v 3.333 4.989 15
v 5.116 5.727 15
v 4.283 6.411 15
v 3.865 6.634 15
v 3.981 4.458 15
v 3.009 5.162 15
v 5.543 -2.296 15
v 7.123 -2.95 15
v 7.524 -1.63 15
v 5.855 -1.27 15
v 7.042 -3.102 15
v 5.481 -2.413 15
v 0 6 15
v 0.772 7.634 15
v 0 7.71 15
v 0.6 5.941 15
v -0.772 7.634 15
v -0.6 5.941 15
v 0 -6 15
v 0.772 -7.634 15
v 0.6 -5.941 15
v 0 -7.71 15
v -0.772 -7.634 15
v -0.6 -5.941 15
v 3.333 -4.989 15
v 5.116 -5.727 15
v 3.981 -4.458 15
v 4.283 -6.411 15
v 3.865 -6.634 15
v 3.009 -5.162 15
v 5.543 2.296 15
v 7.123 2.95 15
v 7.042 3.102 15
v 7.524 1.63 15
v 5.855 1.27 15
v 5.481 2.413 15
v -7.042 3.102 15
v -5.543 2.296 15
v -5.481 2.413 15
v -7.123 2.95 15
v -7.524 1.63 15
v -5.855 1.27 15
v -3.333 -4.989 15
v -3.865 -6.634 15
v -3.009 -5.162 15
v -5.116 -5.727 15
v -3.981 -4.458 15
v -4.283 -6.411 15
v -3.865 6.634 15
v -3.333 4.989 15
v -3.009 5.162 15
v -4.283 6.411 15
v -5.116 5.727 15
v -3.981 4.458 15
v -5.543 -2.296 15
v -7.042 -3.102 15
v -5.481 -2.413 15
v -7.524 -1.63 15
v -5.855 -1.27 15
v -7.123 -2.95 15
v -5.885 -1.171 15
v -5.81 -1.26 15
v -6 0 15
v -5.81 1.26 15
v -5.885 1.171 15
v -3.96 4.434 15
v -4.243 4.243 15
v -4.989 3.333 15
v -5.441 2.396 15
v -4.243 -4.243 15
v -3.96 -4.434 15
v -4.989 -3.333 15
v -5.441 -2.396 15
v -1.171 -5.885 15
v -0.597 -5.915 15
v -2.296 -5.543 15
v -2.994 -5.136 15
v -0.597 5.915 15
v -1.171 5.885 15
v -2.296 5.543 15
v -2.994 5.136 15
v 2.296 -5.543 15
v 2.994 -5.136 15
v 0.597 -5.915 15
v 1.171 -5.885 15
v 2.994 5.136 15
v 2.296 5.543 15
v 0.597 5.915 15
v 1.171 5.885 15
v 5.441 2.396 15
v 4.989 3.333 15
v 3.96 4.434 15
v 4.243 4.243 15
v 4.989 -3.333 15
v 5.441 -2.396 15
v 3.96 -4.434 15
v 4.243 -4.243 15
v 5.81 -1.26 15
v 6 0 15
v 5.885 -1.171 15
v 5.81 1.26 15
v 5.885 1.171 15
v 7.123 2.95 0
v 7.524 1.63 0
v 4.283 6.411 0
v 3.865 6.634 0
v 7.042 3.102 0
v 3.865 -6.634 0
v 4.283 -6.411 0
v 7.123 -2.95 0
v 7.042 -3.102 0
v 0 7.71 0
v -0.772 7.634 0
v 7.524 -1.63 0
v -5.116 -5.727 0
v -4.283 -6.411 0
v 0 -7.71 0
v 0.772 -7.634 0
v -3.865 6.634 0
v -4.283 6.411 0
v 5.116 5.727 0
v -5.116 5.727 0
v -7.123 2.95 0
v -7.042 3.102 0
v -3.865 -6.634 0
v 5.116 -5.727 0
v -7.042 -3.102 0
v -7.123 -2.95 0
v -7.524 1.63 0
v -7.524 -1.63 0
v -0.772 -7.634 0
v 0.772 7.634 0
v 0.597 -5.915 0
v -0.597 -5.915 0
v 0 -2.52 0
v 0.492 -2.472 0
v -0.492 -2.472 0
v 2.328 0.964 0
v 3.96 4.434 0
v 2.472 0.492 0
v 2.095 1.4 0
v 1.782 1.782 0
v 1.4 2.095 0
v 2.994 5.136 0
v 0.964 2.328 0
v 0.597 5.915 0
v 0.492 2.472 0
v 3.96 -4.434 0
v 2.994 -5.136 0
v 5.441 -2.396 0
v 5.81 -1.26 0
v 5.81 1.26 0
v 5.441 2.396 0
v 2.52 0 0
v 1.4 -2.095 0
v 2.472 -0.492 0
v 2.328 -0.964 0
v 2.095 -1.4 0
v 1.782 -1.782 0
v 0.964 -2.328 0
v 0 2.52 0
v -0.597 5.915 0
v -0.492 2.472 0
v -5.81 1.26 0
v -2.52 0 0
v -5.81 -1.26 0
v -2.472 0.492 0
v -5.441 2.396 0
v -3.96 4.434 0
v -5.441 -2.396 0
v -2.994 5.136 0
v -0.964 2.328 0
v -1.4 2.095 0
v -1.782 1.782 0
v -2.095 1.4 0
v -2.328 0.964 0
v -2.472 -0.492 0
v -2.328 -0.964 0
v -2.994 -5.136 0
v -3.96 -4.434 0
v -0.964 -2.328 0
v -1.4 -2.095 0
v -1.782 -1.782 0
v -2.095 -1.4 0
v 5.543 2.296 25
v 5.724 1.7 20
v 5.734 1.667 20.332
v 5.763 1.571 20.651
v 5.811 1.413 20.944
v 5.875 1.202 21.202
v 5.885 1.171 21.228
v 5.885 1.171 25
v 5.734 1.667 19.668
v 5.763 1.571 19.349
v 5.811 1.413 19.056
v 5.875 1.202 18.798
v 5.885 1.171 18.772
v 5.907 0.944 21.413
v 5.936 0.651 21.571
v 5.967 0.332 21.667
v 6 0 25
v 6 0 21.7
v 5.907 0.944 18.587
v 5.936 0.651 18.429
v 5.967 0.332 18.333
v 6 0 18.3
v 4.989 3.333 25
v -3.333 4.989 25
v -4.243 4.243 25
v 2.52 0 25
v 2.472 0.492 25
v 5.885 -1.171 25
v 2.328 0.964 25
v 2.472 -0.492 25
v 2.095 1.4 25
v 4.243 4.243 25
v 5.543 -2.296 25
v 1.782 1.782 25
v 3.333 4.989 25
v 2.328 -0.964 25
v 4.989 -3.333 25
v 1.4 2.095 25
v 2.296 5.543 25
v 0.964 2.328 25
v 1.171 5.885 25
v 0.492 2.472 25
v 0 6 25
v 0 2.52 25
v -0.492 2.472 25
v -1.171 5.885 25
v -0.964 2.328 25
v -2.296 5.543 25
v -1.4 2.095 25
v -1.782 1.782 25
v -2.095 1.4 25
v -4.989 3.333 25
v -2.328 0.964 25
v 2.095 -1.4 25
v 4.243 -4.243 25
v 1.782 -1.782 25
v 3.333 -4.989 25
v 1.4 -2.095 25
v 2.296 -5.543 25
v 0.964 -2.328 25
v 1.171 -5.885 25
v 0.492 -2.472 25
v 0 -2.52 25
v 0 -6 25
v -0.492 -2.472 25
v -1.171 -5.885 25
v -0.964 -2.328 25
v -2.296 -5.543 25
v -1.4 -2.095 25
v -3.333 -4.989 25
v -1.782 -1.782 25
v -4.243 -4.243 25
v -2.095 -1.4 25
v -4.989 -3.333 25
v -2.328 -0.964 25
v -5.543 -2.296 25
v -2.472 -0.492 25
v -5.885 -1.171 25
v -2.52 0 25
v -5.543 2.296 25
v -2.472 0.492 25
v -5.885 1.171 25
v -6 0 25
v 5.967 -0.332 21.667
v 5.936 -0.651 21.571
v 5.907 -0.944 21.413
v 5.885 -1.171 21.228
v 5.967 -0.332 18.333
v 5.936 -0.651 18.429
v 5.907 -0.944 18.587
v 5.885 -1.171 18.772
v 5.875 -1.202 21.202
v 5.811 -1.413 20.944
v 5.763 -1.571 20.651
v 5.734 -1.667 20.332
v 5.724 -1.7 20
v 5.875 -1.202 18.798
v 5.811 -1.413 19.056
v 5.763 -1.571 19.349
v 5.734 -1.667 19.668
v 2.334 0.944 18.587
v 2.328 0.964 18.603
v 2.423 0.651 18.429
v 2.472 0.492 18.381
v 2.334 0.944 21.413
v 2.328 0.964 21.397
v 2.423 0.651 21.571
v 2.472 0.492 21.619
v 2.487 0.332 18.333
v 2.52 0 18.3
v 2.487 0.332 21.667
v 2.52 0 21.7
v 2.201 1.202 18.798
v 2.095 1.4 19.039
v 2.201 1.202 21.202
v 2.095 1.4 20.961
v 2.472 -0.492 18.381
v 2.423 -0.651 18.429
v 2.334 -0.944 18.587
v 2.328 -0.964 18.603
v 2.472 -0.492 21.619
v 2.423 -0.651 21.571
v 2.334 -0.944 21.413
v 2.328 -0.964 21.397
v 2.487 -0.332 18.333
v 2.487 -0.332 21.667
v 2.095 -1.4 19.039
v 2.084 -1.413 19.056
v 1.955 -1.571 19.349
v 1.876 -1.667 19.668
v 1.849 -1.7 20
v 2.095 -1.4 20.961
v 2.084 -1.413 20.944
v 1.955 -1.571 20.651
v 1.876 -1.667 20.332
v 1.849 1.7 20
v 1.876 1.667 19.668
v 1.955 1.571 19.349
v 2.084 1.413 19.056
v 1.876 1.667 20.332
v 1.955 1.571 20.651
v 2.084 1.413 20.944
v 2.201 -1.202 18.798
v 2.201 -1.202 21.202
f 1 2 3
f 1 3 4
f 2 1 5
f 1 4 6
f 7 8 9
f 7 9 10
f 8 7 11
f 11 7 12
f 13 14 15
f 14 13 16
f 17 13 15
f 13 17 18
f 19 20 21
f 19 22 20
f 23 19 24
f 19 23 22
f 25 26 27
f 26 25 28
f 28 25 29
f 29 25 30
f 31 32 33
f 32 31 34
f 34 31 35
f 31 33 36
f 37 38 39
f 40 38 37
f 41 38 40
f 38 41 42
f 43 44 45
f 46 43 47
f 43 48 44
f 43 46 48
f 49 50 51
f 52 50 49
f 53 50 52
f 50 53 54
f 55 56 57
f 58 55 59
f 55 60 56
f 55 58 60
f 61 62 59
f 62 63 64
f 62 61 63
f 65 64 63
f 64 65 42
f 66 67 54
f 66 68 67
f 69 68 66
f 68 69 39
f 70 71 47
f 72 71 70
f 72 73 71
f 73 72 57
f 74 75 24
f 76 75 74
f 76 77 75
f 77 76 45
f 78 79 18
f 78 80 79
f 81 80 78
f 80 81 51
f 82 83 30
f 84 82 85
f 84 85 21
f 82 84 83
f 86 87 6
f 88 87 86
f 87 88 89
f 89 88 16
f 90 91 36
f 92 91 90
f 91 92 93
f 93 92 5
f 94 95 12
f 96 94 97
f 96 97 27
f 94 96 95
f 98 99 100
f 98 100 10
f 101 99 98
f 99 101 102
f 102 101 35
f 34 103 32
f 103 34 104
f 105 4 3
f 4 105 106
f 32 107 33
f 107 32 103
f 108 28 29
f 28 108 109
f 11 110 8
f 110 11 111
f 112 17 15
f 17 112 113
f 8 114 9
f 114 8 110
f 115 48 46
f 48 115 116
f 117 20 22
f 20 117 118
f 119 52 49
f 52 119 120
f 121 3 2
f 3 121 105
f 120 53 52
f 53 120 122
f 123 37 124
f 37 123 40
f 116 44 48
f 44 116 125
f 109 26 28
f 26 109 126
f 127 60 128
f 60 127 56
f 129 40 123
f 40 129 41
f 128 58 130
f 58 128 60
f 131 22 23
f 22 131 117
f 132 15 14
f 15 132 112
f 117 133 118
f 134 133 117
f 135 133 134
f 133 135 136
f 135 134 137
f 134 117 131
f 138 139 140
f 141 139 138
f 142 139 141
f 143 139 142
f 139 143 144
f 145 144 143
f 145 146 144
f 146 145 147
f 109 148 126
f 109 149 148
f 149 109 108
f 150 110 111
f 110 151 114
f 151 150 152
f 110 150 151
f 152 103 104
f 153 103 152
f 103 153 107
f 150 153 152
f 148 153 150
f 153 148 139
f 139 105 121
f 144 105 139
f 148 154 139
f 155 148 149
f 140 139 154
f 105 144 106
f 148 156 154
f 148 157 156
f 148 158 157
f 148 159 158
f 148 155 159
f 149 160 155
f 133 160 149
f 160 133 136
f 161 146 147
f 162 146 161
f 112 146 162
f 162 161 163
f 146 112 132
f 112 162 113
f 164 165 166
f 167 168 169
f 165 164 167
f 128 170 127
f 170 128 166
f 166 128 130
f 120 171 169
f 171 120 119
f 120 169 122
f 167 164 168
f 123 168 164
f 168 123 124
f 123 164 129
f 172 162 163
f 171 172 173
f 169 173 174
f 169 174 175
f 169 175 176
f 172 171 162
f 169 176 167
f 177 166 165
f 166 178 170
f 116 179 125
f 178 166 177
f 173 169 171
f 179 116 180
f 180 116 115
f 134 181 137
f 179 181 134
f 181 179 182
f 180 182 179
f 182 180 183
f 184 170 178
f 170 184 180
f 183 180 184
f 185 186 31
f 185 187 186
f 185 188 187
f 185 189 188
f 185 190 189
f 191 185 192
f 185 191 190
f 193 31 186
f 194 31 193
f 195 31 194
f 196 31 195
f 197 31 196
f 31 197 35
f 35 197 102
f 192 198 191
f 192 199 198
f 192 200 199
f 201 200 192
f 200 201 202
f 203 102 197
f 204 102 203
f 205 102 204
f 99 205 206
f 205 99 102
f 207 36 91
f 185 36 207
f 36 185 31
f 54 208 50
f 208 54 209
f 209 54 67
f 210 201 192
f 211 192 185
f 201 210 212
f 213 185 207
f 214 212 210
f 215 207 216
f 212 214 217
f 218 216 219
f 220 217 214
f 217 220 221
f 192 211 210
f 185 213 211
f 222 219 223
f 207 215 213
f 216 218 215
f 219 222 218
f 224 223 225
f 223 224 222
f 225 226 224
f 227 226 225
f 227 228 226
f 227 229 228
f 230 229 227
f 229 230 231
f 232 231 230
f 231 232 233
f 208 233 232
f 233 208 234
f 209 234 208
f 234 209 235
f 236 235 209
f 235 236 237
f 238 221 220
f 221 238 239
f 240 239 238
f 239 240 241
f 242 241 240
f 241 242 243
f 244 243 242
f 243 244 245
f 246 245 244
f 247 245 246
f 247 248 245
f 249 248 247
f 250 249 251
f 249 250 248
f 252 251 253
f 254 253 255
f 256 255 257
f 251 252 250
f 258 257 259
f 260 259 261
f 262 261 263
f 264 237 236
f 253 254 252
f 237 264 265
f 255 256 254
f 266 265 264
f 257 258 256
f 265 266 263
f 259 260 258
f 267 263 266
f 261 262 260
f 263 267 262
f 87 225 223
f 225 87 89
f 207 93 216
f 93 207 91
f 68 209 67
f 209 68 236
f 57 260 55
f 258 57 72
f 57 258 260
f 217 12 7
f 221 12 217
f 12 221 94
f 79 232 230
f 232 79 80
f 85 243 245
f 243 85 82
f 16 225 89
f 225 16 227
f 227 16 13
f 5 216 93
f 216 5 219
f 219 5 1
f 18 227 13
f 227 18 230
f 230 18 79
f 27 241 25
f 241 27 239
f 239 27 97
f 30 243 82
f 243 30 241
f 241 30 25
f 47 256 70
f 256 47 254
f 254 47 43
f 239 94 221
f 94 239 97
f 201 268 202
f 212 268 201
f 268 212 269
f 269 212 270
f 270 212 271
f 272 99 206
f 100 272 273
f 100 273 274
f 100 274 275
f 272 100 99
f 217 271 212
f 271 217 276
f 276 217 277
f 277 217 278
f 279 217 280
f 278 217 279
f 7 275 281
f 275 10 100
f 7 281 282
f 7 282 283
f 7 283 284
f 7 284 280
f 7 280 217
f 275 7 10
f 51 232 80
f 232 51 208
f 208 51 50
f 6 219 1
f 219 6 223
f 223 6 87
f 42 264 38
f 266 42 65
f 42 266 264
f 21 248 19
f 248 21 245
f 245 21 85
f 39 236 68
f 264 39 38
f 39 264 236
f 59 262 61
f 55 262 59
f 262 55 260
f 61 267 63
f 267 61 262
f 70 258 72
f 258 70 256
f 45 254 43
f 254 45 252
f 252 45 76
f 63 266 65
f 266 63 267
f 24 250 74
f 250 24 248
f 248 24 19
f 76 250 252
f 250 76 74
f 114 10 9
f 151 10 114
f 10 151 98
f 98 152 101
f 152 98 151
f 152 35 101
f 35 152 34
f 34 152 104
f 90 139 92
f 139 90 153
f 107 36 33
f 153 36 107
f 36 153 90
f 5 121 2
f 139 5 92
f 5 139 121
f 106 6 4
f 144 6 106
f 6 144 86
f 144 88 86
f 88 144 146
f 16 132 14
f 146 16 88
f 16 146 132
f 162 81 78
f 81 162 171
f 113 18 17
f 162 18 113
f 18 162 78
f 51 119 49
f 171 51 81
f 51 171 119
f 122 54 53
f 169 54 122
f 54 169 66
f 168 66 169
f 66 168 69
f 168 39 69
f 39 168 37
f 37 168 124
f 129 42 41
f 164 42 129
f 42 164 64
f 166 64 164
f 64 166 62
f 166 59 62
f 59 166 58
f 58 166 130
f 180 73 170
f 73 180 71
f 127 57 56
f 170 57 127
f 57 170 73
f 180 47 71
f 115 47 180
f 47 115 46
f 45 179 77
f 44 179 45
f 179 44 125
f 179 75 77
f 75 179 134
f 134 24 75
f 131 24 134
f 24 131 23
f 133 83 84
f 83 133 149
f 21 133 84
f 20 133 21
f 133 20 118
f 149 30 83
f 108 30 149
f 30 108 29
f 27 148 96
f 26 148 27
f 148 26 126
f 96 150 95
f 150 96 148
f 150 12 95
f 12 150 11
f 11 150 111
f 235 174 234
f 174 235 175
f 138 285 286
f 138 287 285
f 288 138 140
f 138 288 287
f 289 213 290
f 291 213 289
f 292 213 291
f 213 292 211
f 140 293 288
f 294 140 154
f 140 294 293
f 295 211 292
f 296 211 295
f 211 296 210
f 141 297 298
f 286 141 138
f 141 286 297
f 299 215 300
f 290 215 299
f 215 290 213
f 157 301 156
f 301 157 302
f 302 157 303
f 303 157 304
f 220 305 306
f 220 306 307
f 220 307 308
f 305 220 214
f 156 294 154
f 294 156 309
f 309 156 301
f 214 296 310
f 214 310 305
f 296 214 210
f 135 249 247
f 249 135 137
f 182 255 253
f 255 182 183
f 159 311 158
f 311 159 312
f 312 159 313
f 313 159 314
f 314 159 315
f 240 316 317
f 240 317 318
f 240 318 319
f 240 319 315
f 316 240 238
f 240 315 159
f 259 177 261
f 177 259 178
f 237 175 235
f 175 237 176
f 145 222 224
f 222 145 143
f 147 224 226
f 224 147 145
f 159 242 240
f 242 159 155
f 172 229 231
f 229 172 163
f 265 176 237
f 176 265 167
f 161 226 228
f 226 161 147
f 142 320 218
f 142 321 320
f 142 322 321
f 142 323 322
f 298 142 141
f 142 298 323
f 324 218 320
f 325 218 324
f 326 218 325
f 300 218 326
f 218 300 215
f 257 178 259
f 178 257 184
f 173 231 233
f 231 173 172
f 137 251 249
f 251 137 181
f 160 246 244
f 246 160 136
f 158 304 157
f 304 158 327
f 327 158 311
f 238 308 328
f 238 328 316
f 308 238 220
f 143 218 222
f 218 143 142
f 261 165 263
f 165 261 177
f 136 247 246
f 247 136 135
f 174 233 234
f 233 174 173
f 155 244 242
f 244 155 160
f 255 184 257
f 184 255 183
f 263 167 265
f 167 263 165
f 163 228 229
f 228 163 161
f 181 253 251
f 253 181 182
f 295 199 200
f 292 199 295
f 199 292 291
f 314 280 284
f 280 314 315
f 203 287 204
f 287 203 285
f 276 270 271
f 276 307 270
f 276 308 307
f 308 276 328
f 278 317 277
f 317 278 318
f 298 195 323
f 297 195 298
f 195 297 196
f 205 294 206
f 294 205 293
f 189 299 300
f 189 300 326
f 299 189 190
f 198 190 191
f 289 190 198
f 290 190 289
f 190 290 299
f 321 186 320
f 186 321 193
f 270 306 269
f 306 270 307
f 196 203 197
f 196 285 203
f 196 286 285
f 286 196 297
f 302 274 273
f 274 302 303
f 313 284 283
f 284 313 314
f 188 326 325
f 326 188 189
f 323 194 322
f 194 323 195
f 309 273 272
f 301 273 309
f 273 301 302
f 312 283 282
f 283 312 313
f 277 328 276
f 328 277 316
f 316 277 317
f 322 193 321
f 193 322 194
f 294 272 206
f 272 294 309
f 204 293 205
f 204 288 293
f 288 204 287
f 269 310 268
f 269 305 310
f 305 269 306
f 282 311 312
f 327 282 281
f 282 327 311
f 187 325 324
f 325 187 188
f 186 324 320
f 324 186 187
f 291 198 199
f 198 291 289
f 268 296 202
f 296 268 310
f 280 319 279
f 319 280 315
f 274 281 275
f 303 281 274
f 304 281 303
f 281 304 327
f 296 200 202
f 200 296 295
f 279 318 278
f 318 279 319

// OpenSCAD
$fn = 32;

// ----------------------------------------------------------------------
// Timing pulley: T5 10T, pitch 5 mm, 15.42 mm x 25 mm
// ----------------------------------------------------------------------

// --- parameters (mm) ---
belt_pitch = 5;           // belt pitch
n_teeth = 10;             // number of grooves
rim_w = 15;               // belt width between the flanges
tip_d = 15.42;            // tip circle diameter
root_d = 12.82;           // groove bottom diameter
groove_h = 1.3;           // groove depth
tooth_w = 3;              // groove width at the tip circle
shaft_d = 5.04;           // shaft bore
hub_d = 12;               // hub diameter
hub_h = 10;               // hub above the flange
bottom_z = 0;             // lowest point of the pulley
top_z = 25;               // highest point of the pulley
set_d = 3.4;              // set screw tap hole

module rim() {
  cylinder(h = rim_w, d = tip_d);
}

module groove_cutter() {
  /* belt tooth groove: deeper than wide, cut through the belt width */
  translate([root_d / 2, 0, 0])
    linear_extrude(height = rim_w)
      polygon(points = [[-0.6, -tooth_w * 0.42], [groove_h + 0.6, -tooth_w * 0.6],
                        [groove_h + 0.6, tooth_w * 0.6], [-0.6, tooth_w * 0.42]]);
}

module hub() {
  translate([0, 0, bottom_z]) cylinder(h = top_z - bottom_z, d = hub_d);
}

difference() {
  union() {
    rim();
    hub();
  }
  for (i = [0 : n_teeth - 1]) rotate([0, 0, i * 360 / n_teeth]) groove_cutter();
  translate([0, 0, bottom_z - 1]) cylinder(h = top_z - bottom_z + 2, d = shaft_d);
  translate([-1, 0, top_z - hub_h * 0.5]) rotate([0, 90, 0]) cylinder(h = hub_d / 2 + 3, d = set_d);
}
